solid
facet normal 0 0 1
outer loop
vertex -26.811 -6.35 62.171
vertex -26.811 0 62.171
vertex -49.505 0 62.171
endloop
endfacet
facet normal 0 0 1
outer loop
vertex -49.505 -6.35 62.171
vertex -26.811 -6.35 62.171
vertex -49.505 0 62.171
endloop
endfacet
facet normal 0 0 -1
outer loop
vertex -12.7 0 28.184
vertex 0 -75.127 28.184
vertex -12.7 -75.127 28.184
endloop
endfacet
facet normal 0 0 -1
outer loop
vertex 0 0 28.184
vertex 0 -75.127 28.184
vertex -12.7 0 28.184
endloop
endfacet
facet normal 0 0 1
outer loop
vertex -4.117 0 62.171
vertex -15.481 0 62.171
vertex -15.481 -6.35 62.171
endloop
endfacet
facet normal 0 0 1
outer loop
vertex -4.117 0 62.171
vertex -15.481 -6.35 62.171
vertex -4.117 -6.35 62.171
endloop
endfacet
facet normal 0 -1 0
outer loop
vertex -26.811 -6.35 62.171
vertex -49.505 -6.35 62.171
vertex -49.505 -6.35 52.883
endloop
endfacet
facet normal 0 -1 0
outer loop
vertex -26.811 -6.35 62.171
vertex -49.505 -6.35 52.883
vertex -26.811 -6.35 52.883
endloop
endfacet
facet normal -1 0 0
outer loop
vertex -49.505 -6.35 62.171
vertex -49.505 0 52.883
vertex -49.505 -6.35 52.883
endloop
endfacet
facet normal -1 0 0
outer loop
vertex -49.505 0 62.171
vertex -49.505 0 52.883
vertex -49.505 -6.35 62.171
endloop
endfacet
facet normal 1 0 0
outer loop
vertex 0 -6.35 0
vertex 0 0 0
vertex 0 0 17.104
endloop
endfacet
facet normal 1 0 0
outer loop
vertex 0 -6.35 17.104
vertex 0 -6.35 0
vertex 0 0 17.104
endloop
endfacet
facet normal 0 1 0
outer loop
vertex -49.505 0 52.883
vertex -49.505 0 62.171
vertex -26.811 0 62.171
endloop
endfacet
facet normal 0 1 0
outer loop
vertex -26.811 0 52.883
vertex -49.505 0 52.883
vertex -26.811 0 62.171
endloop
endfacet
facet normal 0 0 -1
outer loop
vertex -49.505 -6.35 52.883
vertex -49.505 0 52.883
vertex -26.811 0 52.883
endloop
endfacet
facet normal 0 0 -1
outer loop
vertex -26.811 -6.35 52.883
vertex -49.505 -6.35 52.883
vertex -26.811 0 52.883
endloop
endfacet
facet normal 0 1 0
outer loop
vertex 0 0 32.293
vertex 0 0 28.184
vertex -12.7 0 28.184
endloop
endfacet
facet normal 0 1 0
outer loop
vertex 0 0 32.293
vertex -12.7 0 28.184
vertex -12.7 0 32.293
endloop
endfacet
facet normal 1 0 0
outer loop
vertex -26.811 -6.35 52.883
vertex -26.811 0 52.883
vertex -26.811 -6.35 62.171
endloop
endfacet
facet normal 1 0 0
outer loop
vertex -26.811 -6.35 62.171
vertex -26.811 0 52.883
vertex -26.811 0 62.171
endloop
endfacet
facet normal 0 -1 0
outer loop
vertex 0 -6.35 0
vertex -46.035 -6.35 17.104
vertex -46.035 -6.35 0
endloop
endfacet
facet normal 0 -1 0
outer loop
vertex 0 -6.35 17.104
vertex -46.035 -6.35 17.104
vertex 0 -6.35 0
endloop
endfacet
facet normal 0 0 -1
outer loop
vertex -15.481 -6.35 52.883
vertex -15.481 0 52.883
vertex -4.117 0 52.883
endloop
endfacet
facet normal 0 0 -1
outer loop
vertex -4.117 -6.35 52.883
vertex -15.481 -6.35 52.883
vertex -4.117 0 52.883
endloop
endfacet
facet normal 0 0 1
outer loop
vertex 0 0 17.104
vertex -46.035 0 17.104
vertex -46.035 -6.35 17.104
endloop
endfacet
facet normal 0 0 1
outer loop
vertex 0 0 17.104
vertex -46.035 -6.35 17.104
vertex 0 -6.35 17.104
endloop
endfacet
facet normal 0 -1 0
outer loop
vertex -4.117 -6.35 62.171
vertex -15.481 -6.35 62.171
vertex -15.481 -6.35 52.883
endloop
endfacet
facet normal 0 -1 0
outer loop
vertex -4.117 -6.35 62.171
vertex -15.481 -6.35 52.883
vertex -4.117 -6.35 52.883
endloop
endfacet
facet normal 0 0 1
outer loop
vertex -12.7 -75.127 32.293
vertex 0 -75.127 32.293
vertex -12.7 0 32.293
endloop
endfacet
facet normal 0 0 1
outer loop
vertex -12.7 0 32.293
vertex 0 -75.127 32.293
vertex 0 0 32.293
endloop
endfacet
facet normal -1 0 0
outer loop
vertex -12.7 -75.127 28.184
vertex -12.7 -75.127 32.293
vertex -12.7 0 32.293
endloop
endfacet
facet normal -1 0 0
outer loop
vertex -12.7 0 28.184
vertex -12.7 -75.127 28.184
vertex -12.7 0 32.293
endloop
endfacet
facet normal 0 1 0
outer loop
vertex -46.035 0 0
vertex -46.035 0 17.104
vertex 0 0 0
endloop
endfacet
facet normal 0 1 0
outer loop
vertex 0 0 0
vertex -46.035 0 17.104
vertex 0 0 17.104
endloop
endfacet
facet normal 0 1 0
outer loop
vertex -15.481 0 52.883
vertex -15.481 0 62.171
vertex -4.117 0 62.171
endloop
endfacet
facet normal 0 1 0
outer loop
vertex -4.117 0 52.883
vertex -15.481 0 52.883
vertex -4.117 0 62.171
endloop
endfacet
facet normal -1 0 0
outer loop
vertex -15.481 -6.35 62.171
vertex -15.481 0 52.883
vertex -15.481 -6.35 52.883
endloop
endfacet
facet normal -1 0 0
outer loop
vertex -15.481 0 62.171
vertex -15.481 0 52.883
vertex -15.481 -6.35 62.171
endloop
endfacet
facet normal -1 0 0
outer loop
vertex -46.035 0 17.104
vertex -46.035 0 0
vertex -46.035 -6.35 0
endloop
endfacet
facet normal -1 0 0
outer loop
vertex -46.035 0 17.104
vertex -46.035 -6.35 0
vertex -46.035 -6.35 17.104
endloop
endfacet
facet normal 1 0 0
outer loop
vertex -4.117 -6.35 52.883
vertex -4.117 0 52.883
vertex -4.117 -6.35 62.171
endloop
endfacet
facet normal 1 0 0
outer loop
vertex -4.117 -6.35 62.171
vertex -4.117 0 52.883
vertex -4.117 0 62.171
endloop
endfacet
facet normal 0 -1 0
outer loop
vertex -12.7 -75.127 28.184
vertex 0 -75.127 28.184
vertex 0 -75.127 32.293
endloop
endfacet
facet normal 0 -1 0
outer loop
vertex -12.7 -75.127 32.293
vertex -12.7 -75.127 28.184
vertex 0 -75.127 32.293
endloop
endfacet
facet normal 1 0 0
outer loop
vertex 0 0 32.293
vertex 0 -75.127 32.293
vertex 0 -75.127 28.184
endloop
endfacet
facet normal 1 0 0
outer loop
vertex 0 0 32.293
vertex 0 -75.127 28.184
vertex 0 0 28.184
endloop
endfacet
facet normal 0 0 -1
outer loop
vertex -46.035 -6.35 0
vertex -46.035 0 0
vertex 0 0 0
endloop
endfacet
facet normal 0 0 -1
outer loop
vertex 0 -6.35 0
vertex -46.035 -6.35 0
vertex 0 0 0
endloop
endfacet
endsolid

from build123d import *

# Parameters (mm, degrees)
F0_W     = 11.2635307014
F0_H     = 9.2887580395
F0_W_2   = 11.4305992611
F1_DEPTH = 6.35
F0_W_3   = 11.3646090031
F2_W     = 75.1274973154
F2_H     = 4.1087251157
F3_DEPTH = 12.7
F5_W     = 46.0354201496
F5_H     = 17.1042848378
F6_DEPTH = 6.35


# Not quite as in the source:
# - the program builds the solid bodies; features that only make, move or delete a surface that nothing else refers to are left out


with BuildPart() as f1:
    # F0 (on Front) → F1 (new body)
    with BuildSketch(Plane.XZ):
        with Locations((-43.8731033355, 57.5269795954)):
            Rectangle(F0_W, F0_H)
        with Locations((-32.5260383543, 57.5269795954)):
            Rectangle(F0_W_2, F0_H)
    extrude(amount=F1_DEPTH)


with BuildPart() as f1b:
    # F0 (on Front) → F1, piece 2 (new body)
    with BuildSketch(Plane.XZ):
        with Locations((-9.7989132628, 57.5269795954)):
            Rectangle(F0_W_3, F0_H)
    extrude(amount=F1_DEPTH)


with BuildPart() as f3:
    # F2 (on Right) → F3 (new body)
    with BuildSketch(Plane.YZ):
        with Locations((-37.5637486577, 30.2382716909)):
            Rectangle(F2_W, F2_H)
    extrude(amount=-F3_DEPTH)


with BuildPart() as f6:
    # F5 (on Front) → F6 (new body)
    with BuildSketch(Plane.XZ):
        with Locations((-23.0177100748, 8.5521424189)):
            Rectangle(F5_W, F5_H)
    extrude(amount=F6_DEPTH)


solid = Compound([f1.part, f1b.part, f3.part, f6.part])
